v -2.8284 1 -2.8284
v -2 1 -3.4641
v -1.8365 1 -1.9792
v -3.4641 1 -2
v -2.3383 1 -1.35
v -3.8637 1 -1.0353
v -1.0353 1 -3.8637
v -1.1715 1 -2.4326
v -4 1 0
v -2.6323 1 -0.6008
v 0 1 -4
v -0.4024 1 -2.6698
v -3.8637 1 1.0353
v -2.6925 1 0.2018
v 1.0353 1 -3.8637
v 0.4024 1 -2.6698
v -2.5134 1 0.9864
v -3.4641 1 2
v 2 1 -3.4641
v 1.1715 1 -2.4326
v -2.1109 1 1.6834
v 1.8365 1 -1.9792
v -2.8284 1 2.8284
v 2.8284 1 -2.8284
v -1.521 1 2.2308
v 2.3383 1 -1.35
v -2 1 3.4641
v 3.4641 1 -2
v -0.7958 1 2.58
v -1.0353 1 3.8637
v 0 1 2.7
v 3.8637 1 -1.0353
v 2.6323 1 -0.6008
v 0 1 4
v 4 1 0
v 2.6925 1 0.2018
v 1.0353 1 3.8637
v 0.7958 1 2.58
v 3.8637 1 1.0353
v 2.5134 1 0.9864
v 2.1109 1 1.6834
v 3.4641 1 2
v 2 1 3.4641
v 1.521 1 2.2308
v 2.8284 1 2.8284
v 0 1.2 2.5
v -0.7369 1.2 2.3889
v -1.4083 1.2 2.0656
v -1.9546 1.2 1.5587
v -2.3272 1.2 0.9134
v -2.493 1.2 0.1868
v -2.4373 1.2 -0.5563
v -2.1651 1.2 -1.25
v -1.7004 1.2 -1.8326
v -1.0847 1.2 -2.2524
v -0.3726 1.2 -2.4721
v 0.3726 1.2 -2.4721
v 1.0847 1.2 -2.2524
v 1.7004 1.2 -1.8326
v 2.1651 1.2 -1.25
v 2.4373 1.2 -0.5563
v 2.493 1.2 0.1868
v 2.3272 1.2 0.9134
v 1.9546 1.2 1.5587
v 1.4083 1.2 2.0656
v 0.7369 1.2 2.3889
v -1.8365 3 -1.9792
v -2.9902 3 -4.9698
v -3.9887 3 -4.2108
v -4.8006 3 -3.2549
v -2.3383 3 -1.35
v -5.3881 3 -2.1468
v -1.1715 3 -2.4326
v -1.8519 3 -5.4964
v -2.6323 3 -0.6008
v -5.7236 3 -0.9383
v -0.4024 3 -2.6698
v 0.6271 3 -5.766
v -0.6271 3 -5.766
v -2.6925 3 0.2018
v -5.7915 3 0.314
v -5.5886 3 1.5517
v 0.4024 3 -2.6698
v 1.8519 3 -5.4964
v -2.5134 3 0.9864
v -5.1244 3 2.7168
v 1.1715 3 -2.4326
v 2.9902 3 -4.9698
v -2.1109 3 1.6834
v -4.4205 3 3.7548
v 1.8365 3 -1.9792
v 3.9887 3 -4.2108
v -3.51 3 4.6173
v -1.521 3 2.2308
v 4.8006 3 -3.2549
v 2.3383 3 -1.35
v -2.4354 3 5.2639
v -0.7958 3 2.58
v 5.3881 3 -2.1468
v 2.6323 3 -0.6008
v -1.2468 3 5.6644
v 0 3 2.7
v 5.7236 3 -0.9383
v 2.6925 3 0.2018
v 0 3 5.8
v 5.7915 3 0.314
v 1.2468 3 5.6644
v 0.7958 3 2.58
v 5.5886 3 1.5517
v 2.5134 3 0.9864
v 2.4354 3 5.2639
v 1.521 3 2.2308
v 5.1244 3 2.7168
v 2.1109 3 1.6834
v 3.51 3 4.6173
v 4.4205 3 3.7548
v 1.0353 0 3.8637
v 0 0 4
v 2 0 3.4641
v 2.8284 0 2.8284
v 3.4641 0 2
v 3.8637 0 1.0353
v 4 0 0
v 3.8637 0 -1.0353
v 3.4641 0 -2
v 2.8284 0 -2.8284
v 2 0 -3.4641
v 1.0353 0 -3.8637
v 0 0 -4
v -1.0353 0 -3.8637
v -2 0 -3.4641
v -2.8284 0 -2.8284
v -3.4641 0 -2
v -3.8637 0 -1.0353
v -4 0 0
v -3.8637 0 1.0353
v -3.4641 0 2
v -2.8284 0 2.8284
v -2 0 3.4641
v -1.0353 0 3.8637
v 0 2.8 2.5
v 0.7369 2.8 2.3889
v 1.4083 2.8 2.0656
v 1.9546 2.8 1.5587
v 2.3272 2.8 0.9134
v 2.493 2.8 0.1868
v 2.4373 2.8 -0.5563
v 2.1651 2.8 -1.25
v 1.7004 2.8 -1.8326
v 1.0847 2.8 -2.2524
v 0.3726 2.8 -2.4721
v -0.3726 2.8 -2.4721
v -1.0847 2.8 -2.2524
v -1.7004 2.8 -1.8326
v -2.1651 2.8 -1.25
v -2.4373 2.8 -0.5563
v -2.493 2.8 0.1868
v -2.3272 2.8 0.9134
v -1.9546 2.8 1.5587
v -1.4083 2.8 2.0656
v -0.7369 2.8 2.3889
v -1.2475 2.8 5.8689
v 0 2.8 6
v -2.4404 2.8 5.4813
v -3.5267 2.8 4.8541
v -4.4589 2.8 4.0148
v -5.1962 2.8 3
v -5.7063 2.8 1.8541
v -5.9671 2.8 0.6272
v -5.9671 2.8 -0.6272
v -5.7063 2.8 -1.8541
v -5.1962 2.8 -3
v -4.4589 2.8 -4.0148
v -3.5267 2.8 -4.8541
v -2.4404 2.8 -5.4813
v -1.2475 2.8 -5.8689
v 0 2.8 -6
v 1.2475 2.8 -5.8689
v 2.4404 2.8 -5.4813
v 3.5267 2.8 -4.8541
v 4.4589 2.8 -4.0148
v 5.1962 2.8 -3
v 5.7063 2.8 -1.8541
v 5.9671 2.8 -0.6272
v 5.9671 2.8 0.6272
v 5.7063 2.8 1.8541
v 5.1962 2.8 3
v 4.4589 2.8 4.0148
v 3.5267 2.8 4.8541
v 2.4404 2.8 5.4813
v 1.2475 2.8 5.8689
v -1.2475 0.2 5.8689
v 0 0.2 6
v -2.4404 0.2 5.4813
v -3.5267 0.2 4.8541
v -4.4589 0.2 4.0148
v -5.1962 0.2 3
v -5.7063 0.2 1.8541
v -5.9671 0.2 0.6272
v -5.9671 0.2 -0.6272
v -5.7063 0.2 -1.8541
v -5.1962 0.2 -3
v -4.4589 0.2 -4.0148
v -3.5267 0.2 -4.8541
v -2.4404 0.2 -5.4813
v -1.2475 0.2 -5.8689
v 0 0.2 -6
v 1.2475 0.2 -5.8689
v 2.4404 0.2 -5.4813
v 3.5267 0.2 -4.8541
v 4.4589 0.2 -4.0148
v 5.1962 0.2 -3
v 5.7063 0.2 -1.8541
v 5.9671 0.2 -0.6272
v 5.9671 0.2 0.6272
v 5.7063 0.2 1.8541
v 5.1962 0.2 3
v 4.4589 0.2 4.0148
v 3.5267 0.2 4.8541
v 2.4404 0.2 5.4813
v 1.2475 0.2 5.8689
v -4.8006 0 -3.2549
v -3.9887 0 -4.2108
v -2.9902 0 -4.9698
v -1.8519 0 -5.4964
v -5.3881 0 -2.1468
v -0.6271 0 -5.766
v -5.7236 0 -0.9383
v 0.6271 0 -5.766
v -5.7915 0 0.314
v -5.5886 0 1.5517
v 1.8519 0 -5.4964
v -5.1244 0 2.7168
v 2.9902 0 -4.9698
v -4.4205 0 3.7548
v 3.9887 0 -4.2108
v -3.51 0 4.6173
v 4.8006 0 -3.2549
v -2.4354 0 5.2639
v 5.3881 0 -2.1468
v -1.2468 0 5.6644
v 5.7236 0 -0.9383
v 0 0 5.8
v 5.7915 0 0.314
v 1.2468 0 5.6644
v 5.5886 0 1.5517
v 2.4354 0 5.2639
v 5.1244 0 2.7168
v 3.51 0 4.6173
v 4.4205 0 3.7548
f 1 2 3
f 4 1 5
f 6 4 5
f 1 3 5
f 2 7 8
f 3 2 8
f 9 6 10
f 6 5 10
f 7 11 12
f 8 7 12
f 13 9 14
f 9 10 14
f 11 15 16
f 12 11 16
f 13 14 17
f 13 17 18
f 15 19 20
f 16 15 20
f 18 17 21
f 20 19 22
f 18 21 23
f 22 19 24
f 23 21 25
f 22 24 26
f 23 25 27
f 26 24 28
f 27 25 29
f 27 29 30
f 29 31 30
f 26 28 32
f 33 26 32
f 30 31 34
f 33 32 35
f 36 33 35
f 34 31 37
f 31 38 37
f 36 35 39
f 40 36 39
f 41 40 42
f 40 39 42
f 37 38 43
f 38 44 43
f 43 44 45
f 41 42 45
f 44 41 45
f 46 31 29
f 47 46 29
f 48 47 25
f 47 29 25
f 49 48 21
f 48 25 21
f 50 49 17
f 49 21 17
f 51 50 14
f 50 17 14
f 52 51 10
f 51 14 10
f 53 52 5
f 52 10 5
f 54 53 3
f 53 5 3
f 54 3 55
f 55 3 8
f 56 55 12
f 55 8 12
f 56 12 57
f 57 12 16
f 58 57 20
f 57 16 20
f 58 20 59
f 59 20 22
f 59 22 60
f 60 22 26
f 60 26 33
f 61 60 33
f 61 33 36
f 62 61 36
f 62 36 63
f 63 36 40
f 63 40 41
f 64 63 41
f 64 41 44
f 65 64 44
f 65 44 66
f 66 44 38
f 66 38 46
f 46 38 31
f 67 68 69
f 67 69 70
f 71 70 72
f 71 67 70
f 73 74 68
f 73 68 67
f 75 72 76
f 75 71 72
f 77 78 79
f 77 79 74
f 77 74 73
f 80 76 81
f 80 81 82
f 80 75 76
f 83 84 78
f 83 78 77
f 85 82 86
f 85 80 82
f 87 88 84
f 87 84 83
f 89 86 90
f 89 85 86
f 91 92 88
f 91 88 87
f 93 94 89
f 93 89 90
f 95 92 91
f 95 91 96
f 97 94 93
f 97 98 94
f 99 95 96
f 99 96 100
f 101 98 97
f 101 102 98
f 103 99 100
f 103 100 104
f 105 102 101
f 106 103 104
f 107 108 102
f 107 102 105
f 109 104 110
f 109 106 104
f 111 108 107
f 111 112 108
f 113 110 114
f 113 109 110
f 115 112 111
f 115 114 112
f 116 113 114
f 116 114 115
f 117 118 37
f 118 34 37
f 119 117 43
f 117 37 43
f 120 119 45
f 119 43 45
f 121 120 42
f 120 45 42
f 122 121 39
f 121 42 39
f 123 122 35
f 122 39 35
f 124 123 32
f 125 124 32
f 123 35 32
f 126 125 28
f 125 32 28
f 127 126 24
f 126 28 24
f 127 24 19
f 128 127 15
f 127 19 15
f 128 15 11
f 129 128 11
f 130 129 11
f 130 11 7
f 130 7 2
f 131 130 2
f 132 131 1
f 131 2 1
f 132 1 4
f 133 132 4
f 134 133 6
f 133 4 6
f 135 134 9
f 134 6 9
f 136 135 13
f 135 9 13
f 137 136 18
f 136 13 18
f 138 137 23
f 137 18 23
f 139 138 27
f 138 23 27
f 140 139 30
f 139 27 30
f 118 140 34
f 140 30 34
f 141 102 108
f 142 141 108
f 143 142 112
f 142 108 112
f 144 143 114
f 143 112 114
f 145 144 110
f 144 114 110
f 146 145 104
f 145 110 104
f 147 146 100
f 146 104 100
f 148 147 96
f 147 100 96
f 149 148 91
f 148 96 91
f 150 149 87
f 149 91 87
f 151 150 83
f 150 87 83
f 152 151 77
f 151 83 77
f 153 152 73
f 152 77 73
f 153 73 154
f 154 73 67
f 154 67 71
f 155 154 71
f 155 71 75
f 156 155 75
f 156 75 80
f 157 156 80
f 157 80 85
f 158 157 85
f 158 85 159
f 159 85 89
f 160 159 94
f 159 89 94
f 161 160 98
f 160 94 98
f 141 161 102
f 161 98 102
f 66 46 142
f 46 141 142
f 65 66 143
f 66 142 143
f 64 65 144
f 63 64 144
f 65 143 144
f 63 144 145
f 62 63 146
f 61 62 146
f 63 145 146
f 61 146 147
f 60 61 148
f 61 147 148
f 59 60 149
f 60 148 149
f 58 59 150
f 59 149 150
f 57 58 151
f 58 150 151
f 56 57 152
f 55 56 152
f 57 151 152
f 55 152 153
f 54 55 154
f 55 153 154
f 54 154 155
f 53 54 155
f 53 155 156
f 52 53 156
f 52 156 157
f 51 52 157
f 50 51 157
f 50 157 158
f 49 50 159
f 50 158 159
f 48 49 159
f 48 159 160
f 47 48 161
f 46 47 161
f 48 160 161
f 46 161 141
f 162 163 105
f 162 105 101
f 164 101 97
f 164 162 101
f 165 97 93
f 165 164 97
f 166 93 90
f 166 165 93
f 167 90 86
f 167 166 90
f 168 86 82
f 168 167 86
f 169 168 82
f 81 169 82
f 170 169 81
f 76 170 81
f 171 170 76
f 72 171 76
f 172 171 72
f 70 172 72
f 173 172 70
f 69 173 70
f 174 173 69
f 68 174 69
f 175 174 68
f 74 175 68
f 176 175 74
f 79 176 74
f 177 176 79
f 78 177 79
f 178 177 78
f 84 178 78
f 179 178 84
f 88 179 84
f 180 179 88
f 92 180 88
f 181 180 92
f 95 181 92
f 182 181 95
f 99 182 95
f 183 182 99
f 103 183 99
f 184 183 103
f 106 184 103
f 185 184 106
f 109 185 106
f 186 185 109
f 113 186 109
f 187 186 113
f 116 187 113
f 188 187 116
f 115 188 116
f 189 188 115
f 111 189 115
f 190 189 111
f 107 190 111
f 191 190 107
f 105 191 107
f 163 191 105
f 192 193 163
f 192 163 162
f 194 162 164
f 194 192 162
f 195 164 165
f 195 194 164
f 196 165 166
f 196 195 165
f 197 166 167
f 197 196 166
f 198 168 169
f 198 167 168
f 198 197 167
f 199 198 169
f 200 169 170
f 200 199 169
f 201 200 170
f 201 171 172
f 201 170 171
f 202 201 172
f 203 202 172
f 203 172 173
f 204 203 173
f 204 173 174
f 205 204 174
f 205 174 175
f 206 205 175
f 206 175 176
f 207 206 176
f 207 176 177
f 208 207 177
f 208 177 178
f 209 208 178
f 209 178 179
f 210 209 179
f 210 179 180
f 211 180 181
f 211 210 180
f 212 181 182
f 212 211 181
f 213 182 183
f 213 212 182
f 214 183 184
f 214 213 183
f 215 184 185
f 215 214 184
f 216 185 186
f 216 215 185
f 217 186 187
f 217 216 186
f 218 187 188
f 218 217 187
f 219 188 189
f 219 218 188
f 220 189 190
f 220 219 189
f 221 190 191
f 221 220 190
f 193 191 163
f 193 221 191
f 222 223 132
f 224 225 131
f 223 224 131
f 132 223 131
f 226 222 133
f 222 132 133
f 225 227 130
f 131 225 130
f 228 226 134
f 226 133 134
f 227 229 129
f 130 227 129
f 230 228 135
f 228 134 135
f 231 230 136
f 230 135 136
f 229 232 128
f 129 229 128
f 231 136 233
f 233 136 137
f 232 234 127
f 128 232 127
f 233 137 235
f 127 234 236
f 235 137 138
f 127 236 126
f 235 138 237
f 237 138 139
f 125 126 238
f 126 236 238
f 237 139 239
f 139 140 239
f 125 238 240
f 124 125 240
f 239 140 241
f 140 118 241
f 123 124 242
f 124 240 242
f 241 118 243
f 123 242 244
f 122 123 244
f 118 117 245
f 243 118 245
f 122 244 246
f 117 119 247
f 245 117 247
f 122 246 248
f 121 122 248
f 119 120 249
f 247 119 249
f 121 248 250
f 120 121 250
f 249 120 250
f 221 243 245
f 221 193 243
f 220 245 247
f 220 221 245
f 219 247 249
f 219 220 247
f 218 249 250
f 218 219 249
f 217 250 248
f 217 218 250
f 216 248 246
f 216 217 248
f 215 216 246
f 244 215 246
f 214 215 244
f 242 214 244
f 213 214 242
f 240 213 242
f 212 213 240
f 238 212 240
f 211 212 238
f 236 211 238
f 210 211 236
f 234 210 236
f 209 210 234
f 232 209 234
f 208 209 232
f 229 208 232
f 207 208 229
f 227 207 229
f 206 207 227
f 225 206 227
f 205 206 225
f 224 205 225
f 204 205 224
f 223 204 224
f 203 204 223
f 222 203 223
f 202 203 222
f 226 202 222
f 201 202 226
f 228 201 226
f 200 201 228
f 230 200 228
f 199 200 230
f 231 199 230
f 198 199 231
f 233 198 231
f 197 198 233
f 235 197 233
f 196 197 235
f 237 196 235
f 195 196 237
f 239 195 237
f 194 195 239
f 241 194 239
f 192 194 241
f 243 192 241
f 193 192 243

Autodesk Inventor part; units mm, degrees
ref_plane "YZ Plane" through (0, 0, 0) normal (1, 0, 0) x (0, 1, 0)
ref_plane "XZ Plane" through (0, 0, 0) normal (0, 1, 0) x (-1, 0, 0)
ref_plane "XY Plane" through (0, 0, 0) normal (0, 0, 1) x (1, 0, 0)
sketch "Skizze3" plane through (0, 0, 0) normal (1, 0, 0) x (0, 1, 0)
  line L0 (0, 0) -> (6.2939, 0)
  line L1 (0, 6) -> (0, 4)
  line L2 (0, 4) -> (1, 4)
  line L3 (1, 4) -> (1, 2.5)
  line L4 (1, 2.5) -> (3, 2.5)
  line L5 (3, 2.5) -> (3, 6)
  line L6 (3, 6) -> (0, 6)
  dimension "d4" = 12
  dimension "d5" = 5
  dimension "d6" = 3
  dimension "d7" = 1
  dimension "d9" = 8
revolve "Umdrehung1" add sketch "Skizze3" angle 360 about axis through (0, 0, 0) along (0, 1, 0)
chamfer "Fase1" distance 0.2 angle 45 4 edges at (0, 3, -6) (0, 0, -6) (0, 3, -2.5) (0, 1, -2.5)
properties part number "BT013_huenin20_23" material "Gummi"
